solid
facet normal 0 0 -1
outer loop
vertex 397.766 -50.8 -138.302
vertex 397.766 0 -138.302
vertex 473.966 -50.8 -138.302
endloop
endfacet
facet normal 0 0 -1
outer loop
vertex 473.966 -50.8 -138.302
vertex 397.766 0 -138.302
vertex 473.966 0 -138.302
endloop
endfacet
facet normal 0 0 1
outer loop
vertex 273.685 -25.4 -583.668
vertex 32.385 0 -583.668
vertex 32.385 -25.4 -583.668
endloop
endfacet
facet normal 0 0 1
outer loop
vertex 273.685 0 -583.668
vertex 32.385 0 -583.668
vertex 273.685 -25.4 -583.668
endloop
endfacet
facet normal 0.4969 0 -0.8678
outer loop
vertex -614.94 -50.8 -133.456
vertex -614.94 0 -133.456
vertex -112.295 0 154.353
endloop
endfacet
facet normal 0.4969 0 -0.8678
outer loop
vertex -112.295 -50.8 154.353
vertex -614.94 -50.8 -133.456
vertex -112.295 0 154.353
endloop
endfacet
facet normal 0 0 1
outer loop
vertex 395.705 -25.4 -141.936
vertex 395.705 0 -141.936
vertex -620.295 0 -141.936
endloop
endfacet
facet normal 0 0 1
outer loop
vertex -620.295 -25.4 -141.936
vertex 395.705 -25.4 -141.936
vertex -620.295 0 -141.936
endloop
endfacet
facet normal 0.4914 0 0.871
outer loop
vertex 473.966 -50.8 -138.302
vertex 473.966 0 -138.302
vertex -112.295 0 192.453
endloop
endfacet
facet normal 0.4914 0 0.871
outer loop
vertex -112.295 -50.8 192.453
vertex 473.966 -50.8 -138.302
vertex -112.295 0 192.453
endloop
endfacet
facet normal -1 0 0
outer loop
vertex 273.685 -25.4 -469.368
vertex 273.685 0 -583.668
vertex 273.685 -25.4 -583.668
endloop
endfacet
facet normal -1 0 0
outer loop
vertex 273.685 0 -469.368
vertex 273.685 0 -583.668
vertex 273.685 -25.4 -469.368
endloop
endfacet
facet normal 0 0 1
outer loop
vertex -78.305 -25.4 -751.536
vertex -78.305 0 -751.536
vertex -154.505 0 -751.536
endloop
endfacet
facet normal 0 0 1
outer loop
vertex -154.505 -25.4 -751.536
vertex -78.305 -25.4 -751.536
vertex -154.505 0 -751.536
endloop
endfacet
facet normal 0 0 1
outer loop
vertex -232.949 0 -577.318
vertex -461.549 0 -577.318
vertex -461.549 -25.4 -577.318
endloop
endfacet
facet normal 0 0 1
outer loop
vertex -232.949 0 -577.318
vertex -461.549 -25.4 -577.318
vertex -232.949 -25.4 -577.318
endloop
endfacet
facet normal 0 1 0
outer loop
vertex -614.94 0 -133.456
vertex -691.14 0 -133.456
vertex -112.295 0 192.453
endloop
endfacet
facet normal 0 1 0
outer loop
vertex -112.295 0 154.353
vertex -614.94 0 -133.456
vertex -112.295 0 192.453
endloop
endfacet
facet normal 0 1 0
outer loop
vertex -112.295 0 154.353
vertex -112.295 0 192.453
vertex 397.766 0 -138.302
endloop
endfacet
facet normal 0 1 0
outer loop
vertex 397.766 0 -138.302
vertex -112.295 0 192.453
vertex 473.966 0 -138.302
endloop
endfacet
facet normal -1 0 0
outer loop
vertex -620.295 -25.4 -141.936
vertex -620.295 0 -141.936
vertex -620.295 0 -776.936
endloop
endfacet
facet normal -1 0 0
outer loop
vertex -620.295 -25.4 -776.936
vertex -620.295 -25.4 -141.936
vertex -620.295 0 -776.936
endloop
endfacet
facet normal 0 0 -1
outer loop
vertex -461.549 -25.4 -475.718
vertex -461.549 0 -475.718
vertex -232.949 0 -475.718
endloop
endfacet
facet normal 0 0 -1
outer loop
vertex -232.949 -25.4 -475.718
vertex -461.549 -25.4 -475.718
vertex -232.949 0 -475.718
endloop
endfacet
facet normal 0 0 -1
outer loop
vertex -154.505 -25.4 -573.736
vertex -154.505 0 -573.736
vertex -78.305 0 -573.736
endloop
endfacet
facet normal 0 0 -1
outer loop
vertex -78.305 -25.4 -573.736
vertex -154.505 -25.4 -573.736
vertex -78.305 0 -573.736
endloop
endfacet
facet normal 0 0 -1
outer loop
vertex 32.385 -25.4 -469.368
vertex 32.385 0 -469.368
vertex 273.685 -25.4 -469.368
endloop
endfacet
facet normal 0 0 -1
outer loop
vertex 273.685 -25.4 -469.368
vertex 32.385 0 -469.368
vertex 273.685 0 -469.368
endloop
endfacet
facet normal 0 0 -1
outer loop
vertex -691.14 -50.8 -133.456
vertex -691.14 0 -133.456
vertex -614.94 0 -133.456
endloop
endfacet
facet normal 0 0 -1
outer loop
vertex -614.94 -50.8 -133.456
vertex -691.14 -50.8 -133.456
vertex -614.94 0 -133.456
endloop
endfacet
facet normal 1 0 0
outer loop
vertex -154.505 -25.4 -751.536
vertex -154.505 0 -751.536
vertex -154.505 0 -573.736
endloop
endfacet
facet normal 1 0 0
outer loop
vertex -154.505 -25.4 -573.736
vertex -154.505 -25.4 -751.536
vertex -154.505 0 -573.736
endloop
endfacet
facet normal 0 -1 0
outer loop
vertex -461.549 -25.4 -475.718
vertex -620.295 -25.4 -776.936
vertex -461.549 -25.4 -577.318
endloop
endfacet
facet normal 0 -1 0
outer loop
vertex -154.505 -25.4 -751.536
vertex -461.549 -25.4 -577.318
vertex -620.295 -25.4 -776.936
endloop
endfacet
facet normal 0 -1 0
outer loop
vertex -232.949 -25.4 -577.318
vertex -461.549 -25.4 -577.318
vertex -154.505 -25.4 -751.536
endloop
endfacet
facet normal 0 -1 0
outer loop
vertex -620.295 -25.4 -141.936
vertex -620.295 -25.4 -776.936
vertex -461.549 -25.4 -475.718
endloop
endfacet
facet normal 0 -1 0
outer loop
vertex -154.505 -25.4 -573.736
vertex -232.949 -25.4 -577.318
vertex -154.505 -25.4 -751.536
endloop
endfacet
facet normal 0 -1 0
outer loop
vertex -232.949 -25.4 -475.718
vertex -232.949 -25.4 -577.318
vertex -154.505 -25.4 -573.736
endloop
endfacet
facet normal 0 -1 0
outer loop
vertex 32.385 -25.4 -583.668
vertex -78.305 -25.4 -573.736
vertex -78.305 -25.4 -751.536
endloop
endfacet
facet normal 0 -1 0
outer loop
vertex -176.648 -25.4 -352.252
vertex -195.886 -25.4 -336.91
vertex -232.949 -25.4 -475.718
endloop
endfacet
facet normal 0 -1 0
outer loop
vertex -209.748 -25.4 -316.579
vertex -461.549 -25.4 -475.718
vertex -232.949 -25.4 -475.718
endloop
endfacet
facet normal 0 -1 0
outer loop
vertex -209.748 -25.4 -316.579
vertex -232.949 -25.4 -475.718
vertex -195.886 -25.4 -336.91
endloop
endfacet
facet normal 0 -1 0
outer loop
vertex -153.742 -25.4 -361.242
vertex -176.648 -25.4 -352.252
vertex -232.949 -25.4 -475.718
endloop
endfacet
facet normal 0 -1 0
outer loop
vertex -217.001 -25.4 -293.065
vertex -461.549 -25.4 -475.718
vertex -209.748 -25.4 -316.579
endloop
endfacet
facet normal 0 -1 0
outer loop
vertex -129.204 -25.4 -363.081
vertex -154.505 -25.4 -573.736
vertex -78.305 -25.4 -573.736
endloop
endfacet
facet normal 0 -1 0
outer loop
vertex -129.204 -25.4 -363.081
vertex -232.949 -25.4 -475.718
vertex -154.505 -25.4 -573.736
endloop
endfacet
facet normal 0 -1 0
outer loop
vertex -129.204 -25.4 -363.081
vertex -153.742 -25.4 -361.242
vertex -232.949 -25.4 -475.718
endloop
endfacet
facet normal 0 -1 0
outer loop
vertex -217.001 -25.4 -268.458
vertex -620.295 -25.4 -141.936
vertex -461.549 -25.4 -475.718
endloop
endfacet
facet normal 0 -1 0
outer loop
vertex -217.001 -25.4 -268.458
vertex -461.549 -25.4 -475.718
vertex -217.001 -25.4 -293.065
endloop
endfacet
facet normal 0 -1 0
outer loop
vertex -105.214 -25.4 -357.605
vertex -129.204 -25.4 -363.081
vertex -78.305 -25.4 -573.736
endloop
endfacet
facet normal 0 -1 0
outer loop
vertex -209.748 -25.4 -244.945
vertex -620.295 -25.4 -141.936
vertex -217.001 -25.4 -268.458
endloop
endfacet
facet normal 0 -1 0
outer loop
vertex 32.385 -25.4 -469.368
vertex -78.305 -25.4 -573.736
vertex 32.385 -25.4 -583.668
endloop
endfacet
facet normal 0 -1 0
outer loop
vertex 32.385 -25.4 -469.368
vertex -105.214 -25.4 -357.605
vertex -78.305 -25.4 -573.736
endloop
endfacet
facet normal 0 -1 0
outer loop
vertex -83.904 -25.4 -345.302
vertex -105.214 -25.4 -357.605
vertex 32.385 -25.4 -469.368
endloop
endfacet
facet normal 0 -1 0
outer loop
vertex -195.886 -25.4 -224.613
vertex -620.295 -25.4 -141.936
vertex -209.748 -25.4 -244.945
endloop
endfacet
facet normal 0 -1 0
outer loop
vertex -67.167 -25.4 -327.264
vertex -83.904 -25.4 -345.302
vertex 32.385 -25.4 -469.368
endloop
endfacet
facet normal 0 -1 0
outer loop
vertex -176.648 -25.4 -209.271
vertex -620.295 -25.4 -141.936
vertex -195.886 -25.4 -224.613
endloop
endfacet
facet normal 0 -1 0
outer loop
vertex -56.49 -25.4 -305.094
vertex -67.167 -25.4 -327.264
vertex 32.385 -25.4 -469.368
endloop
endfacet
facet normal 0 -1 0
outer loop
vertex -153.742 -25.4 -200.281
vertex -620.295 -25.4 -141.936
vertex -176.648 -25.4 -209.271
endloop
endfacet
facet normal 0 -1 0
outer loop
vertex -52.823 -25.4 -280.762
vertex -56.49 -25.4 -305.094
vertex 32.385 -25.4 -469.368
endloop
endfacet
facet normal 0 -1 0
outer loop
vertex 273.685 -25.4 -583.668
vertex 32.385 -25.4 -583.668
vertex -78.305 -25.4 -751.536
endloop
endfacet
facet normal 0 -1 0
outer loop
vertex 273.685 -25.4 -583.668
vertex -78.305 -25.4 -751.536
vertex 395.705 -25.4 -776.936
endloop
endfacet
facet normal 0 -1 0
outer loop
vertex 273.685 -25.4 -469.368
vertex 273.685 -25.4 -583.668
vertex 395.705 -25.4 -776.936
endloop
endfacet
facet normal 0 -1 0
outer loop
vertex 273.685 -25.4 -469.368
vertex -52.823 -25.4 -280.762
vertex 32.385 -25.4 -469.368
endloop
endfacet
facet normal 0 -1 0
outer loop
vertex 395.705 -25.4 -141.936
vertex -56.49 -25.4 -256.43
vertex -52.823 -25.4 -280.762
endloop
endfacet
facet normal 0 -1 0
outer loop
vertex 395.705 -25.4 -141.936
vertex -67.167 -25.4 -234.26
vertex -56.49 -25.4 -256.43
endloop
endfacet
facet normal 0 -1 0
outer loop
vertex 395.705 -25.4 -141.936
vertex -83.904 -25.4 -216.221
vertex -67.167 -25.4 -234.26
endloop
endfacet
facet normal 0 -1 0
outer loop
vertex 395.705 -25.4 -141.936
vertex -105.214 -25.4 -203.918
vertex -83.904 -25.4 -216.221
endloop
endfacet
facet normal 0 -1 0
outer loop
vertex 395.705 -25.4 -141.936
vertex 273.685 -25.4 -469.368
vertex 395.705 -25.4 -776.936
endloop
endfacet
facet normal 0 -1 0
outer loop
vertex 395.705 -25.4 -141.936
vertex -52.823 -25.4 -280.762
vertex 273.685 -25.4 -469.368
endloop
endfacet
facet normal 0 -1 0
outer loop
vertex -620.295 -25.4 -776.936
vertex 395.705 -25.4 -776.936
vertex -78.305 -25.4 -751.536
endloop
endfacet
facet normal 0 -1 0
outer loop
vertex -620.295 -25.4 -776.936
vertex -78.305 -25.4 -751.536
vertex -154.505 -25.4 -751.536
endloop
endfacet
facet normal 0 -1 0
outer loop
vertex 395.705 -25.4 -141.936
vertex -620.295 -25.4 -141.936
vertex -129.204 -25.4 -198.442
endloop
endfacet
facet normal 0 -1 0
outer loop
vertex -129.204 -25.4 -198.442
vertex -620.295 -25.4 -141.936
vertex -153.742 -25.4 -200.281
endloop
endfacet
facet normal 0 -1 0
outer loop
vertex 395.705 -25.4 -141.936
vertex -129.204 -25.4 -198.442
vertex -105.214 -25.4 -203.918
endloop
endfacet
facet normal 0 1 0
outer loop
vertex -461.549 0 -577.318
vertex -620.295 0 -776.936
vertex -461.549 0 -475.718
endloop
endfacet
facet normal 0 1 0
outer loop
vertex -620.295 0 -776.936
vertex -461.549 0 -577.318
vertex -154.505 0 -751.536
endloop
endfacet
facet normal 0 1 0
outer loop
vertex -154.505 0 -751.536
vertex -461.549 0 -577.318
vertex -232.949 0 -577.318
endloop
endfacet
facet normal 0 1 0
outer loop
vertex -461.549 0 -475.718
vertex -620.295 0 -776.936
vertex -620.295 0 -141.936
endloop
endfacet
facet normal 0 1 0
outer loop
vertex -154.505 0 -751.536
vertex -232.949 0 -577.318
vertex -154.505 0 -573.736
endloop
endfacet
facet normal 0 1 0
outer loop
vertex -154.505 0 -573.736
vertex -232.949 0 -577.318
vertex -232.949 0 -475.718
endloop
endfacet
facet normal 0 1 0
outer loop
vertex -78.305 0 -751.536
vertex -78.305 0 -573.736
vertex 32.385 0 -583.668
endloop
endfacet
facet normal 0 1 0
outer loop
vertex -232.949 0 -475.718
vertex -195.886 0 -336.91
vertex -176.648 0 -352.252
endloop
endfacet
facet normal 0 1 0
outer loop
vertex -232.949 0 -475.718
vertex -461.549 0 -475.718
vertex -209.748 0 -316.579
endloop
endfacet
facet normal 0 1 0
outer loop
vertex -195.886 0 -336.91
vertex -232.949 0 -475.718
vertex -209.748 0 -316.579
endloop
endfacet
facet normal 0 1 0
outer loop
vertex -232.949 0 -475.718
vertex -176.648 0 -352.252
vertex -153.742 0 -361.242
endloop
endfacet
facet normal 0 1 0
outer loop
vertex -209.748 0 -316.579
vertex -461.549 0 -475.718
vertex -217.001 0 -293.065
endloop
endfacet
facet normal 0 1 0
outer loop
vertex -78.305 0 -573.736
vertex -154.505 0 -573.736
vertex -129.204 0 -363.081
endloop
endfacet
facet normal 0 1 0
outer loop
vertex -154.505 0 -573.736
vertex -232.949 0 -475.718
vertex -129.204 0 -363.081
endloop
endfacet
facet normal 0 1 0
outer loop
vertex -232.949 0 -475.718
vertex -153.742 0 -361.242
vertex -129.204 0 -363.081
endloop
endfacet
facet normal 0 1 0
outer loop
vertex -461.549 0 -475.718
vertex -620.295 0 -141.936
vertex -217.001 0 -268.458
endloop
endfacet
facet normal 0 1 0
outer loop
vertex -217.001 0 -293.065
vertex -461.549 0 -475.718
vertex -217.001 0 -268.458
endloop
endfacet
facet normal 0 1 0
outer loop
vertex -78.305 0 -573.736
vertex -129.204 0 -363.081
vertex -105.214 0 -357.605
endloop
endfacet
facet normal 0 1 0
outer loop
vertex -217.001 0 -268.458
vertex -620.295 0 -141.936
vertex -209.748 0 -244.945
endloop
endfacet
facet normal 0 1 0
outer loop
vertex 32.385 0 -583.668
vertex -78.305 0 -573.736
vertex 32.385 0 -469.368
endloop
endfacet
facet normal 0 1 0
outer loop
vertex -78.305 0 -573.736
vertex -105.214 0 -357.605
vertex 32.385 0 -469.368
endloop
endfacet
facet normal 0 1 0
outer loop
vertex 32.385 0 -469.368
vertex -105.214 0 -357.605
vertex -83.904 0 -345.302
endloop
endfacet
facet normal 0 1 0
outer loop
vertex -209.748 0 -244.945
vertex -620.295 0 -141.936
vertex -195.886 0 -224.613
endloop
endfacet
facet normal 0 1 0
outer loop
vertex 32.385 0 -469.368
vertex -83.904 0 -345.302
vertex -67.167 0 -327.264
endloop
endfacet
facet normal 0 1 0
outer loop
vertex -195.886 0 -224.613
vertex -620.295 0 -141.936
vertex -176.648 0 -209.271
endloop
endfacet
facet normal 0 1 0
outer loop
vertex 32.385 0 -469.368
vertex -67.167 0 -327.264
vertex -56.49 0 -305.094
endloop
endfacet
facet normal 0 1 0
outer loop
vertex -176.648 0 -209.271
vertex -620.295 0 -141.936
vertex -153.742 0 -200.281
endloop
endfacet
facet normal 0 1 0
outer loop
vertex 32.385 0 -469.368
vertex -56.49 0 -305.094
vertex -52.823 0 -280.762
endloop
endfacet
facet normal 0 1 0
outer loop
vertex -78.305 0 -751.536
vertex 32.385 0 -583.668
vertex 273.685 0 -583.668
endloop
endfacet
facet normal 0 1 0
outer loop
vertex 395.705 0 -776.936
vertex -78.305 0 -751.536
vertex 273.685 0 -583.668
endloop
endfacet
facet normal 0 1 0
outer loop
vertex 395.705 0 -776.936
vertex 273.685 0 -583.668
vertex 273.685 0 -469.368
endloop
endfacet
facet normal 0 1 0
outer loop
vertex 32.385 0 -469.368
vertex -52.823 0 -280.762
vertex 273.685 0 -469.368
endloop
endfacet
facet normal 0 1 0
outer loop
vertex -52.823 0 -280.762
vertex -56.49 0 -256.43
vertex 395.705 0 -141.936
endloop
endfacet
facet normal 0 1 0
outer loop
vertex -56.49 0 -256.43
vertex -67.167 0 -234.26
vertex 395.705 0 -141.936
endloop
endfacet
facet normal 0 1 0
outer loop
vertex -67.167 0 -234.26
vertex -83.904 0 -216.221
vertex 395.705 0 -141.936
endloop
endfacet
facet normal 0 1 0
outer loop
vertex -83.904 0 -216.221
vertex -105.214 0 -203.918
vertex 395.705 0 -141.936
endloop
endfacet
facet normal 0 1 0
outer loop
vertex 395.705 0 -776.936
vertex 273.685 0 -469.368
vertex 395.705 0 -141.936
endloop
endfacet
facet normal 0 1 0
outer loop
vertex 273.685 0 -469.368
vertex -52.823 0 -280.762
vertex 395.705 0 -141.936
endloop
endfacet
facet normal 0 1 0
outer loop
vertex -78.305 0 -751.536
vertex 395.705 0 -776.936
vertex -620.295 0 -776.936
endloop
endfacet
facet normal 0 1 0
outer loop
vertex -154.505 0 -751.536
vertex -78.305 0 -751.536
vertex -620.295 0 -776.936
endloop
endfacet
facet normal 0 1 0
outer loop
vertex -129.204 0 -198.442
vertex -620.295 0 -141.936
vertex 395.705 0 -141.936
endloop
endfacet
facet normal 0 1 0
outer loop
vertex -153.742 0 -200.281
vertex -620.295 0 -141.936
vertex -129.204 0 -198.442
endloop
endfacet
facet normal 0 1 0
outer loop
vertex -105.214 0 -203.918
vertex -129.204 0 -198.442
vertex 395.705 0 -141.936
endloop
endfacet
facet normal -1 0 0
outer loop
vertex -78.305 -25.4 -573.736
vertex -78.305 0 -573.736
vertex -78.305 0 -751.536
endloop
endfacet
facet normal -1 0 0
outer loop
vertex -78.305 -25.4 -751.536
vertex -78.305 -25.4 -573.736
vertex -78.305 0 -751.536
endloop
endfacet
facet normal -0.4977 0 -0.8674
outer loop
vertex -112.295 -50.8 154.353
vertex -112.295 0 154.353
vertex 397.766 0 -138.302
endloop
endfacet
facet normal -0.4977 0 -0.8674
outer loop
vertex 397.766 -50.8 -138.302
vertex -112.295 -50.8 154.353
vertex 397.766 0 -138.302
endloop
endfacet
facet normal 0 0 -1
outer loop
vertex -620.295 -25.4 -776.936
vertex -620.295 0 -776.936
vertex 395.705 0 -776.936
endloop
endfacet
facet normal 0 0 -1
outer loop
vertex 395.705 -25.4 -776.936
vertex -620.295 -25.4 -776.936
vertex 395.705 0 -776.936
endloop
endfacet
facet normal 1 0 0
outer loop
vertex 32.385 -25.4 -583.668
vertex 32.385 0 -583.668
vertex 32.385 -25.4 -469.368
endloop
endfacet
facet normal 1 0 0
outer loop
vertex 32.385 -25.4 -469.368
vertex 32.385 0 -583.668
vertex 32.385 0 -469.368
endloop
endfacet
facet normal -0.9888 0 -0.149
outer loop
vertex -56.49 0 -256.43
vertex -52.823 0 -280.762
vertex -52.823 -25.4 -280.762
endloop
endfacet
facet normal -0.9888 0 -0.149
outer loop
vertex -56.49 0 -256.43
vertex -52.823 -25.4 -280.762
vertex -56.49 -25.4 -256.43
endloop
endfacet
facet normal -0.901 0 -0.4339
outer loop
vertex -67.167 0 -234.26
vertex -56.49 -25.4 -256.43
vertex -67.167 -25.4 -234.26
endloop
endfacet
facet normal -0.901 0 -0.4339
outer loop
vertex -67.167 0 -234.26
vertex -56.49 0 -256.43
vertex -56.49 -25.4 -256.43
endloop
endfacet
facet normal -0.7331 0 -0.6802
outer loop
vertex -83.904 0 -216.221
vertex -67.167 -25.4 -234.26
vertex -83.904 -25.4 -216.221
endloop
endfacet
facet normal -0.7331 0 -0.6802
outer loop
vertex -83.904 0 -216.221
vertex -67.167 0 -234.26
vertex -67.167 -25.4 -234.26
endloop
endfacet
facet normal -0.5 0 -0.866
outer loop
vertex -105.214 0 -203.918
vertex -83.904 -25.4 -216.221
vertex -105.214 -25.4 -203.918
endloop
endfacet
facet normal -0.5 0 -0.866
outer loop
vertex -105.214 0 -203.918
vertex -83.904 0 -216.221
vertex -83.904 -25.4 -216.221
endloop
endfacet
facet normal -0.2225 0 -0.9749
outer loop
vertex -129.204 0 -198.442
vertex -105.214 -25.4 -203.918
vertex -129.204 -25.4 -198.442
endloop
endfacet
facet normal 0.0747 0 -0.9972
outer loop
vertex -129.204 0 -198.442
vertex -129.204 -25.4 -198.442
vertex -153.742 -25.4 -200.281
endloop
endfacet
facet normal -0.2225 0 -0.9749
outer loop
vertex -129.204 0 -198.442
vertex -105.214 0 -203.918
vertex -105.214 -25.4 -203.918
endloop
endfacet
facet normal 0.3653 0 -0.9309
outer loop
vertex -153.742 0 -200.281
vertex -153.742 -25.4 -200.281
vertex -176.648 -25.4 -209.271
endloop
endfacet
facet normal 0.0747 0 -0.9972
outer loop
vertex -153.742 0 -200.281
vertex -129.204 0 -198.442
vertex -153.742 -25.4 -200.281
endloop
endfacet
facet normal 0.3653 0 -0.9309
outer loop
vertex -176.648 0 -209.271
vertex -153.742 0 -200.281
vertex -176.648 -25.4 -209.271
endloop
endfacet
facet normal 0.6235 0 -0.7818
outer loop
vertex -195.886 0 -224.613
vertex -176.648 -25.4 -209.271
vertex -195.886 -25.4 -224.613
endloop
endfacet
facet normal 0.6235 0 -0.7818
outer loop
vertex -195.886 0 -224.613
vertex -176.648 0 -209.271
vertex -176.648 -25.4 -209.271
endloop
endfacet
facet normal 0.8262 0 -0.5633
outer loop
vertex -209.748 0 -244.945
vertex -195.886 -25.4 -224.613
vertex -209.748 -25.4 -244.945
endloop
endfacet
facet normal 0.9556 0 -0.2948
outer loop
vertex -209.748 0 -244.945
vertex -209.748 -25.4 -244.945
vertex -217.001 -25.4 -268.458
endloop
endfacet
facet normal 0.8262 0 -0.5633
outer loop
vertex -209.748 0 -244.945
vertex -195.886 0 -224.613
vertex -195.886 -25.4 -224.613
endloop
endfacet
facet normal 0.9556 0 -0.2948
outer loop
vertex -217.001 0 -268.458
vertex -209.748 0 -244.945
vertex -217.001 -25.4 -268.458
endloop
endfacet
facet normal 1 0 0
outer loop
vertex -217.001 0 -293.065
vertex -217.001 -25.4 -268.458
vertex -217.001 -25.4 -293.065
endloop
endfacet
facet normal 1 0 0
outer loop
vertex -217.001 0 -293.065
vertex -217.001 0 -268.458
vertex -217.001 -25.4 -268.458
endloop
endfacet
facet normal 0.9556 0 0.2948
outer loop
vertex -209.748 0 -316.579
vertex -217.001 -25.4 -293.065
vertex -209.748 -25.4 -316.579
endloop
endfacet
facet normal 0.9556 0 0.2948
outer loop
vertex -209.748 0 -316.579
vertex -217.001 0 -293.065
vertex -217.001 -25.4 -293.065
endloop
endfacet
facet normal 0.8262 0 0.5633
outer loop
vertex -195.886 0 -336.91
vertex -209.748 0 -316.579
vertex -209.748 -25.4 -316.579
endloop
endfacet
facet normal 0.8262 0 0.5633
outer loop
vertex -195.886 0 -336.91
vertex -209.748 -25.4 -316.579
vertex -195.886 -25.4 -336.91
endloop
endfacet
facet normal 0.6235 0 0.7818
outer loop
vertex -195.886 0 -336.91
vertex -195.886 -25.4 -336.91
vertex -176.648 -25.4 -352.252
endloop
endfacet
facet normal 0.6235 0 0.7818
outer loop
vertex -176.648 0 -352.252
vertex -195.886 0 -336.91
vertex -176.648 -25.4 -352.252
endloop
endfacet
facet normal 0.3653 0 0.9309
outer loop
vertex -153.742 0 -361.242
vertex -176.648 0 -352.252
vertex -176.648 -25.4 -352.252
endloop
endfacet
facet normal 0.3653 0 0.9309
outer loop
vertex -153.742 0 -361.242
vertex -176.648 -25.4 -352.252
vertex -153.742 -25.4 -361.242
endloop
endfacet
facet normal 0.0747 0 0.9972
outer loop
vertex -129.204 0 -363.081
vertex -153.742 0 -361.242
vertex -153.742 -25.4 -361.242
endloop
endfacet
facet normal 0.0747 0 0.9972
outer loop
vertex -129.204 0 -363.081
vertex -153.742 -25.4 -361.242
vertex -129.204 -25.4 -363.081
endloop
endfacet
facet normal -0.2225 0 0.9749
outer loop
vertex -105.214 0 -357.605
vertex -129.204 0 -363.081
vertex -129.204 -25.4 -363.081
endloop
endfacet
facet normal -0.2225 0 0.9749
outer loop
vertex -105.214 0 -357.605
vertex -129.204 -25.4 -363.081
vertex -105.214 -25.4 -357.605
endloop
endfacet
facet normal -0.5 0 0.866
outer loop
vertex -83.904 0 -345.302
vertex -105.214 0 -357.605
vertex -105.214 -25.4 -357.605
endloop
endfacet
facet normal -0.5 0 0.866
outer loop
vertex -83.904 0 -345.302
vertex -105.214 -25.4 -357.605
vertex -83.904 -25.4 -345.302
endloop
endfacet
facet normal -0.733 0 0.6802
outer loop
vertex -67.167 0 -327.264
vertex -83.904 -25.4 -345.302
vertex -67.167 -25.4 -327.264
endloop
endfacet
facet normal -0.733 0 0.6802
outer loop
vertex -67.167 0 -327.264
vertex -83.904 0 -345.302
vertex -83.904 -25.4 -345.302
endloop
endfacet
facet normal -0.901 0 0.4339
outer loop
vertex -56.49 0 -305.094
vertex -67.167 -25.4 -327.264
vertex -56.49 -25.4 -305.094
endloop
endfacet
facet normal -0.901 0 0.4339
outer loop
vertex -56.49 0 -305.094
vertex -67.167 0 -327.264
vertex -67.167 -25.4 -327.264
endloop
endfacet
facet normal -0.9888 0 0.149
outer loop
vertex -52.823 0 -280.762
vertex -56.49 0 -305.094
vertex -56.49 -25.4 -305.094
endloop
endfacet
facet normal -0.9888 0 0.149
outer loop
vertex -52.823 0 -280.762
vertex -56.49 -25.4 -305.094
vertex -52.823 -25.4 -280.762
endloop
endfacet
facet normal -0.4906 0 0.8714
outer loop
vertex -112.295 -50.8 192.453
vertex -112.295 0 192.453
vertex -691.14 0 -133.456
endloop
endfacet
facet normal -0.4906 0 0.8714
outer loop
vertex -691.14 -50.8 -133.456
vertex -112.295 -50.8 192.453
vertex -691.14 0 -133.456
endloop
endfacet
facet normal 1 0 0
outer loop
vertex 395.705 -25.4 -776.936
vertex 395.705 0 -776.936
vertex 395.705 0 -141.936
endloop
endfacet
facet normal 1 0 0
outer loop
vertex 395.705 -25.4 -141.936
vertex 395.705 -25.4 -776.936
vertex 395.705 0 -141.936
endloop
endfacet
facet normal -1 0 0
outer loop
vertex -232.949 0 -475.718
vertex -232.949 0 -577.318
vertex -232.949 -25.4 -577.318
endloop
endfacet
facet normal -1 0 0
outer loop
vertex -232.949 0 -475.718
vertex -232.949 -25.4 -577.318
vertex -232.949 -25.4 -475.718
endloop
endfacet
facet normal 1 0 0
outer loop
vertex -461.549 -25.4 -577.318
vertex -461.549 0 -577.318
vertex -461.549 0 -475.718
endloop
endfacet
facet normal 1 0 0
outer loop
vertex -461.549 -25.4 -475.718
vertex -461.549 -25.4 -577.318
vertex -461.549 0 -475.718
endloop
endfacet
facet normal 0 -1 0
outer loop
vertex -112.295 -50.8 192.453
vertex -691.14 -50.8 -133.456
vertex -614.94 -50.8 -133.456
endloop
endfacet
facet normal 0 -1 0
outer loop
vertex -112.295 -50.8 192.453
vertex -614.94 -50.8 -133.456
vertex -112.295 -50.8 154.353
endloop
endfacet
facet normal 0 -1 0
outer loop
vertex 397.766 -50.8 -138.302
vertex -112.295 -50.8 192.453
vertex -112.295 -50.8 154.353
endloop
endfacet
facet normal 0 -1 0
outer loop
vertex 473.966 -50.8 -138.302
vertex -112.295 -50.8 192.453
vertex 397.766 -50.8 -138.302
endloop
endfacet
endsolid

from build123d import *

# Parameters (mm, degrees)
F1_DEPTH = 25.4
F0_W     = 228.6
F0_H     = 101.6
F0_W_2   = 241.3
F0_H_2   = 114.3
F0_R     = 82.55
F2_DEPTH = 25.4


with BuildPart() as f1:
    # F0 (on Front) → F1 (new body)
    with BuildSketch(Plane.XZ):
        Polygon((-691.140294, -133.456394), (-614.940294, -133.456394), (-112.294808, 154.353469), (-112.294808, 192.453469), align=None)
        Polygon((-112.294808, 192.453469), (-112.294808, 154.353469), (397.766284, -138.301879), (473.966284, -138.301879), align=None)
    extrude(amount=F1_DEPTH)

    # F0 (on Front) + F1_face (on face) → F2 (join)
    with BuildSketch(Plane.XZ):
        Polygon((-112.294808, -141.935989), (-620.294808, -141.935989), (-620.294808, -751.535989), (-154.505461, -751.535989), (-154.505461, -573.735989), (-78.305461, -573.735989), (-78.305461, -751.535989), (395.705192, -751.535989), (395.705192, -141.935989), align=None)
        with Locations((-347.24948, -526.518311)):
            Rectangle(F0_W, F0_H, mode=Mode.SUBTRACT)
        with Locations((153.034674, -526.518311)):
            Rectangle(F0_W_2, F0_H_2, mode=Mode.SUBTRACT)
        with Locations((-135.372773, -280.761659)):
            Circle(F0_R, mode=Mode.SUBTRACT)
        Polygon((-154.505461, -751.535989), (-620.294808, -751.535989), (-620.294808, -776.935989), (395.705192, -776.935989), (395.705192, -751.535989), (-78.305461, -751.535989), align=None)
        Polygon((-691.140294, -133.456394), (-614.940294, -133.456394), (-112.294808, 154.353469), (-112.294808, 192.453469), align=None)
        Polygon((-112.294808, 192.453469), (-112.294808, 154.353469), (397.766284, -138.301879), (473.966284, -138.301879), align=None)
    with BuildSketch(Plane(origin=(-108.310702, -25.4, 15.67611), x_dir=(1, 0, 0), z_dir=(0, -1, 0))):
        Polygon((-3.984106, 176.777359), (-582.829592, -149.132504), (-506.629592, -149.132504), (-3.984106, 138.677359), (506.076986, -153.977989), (582.276986, -153.977989), align=None)
    extrude(amount=F2_DEPTH)


solid = f1.part
